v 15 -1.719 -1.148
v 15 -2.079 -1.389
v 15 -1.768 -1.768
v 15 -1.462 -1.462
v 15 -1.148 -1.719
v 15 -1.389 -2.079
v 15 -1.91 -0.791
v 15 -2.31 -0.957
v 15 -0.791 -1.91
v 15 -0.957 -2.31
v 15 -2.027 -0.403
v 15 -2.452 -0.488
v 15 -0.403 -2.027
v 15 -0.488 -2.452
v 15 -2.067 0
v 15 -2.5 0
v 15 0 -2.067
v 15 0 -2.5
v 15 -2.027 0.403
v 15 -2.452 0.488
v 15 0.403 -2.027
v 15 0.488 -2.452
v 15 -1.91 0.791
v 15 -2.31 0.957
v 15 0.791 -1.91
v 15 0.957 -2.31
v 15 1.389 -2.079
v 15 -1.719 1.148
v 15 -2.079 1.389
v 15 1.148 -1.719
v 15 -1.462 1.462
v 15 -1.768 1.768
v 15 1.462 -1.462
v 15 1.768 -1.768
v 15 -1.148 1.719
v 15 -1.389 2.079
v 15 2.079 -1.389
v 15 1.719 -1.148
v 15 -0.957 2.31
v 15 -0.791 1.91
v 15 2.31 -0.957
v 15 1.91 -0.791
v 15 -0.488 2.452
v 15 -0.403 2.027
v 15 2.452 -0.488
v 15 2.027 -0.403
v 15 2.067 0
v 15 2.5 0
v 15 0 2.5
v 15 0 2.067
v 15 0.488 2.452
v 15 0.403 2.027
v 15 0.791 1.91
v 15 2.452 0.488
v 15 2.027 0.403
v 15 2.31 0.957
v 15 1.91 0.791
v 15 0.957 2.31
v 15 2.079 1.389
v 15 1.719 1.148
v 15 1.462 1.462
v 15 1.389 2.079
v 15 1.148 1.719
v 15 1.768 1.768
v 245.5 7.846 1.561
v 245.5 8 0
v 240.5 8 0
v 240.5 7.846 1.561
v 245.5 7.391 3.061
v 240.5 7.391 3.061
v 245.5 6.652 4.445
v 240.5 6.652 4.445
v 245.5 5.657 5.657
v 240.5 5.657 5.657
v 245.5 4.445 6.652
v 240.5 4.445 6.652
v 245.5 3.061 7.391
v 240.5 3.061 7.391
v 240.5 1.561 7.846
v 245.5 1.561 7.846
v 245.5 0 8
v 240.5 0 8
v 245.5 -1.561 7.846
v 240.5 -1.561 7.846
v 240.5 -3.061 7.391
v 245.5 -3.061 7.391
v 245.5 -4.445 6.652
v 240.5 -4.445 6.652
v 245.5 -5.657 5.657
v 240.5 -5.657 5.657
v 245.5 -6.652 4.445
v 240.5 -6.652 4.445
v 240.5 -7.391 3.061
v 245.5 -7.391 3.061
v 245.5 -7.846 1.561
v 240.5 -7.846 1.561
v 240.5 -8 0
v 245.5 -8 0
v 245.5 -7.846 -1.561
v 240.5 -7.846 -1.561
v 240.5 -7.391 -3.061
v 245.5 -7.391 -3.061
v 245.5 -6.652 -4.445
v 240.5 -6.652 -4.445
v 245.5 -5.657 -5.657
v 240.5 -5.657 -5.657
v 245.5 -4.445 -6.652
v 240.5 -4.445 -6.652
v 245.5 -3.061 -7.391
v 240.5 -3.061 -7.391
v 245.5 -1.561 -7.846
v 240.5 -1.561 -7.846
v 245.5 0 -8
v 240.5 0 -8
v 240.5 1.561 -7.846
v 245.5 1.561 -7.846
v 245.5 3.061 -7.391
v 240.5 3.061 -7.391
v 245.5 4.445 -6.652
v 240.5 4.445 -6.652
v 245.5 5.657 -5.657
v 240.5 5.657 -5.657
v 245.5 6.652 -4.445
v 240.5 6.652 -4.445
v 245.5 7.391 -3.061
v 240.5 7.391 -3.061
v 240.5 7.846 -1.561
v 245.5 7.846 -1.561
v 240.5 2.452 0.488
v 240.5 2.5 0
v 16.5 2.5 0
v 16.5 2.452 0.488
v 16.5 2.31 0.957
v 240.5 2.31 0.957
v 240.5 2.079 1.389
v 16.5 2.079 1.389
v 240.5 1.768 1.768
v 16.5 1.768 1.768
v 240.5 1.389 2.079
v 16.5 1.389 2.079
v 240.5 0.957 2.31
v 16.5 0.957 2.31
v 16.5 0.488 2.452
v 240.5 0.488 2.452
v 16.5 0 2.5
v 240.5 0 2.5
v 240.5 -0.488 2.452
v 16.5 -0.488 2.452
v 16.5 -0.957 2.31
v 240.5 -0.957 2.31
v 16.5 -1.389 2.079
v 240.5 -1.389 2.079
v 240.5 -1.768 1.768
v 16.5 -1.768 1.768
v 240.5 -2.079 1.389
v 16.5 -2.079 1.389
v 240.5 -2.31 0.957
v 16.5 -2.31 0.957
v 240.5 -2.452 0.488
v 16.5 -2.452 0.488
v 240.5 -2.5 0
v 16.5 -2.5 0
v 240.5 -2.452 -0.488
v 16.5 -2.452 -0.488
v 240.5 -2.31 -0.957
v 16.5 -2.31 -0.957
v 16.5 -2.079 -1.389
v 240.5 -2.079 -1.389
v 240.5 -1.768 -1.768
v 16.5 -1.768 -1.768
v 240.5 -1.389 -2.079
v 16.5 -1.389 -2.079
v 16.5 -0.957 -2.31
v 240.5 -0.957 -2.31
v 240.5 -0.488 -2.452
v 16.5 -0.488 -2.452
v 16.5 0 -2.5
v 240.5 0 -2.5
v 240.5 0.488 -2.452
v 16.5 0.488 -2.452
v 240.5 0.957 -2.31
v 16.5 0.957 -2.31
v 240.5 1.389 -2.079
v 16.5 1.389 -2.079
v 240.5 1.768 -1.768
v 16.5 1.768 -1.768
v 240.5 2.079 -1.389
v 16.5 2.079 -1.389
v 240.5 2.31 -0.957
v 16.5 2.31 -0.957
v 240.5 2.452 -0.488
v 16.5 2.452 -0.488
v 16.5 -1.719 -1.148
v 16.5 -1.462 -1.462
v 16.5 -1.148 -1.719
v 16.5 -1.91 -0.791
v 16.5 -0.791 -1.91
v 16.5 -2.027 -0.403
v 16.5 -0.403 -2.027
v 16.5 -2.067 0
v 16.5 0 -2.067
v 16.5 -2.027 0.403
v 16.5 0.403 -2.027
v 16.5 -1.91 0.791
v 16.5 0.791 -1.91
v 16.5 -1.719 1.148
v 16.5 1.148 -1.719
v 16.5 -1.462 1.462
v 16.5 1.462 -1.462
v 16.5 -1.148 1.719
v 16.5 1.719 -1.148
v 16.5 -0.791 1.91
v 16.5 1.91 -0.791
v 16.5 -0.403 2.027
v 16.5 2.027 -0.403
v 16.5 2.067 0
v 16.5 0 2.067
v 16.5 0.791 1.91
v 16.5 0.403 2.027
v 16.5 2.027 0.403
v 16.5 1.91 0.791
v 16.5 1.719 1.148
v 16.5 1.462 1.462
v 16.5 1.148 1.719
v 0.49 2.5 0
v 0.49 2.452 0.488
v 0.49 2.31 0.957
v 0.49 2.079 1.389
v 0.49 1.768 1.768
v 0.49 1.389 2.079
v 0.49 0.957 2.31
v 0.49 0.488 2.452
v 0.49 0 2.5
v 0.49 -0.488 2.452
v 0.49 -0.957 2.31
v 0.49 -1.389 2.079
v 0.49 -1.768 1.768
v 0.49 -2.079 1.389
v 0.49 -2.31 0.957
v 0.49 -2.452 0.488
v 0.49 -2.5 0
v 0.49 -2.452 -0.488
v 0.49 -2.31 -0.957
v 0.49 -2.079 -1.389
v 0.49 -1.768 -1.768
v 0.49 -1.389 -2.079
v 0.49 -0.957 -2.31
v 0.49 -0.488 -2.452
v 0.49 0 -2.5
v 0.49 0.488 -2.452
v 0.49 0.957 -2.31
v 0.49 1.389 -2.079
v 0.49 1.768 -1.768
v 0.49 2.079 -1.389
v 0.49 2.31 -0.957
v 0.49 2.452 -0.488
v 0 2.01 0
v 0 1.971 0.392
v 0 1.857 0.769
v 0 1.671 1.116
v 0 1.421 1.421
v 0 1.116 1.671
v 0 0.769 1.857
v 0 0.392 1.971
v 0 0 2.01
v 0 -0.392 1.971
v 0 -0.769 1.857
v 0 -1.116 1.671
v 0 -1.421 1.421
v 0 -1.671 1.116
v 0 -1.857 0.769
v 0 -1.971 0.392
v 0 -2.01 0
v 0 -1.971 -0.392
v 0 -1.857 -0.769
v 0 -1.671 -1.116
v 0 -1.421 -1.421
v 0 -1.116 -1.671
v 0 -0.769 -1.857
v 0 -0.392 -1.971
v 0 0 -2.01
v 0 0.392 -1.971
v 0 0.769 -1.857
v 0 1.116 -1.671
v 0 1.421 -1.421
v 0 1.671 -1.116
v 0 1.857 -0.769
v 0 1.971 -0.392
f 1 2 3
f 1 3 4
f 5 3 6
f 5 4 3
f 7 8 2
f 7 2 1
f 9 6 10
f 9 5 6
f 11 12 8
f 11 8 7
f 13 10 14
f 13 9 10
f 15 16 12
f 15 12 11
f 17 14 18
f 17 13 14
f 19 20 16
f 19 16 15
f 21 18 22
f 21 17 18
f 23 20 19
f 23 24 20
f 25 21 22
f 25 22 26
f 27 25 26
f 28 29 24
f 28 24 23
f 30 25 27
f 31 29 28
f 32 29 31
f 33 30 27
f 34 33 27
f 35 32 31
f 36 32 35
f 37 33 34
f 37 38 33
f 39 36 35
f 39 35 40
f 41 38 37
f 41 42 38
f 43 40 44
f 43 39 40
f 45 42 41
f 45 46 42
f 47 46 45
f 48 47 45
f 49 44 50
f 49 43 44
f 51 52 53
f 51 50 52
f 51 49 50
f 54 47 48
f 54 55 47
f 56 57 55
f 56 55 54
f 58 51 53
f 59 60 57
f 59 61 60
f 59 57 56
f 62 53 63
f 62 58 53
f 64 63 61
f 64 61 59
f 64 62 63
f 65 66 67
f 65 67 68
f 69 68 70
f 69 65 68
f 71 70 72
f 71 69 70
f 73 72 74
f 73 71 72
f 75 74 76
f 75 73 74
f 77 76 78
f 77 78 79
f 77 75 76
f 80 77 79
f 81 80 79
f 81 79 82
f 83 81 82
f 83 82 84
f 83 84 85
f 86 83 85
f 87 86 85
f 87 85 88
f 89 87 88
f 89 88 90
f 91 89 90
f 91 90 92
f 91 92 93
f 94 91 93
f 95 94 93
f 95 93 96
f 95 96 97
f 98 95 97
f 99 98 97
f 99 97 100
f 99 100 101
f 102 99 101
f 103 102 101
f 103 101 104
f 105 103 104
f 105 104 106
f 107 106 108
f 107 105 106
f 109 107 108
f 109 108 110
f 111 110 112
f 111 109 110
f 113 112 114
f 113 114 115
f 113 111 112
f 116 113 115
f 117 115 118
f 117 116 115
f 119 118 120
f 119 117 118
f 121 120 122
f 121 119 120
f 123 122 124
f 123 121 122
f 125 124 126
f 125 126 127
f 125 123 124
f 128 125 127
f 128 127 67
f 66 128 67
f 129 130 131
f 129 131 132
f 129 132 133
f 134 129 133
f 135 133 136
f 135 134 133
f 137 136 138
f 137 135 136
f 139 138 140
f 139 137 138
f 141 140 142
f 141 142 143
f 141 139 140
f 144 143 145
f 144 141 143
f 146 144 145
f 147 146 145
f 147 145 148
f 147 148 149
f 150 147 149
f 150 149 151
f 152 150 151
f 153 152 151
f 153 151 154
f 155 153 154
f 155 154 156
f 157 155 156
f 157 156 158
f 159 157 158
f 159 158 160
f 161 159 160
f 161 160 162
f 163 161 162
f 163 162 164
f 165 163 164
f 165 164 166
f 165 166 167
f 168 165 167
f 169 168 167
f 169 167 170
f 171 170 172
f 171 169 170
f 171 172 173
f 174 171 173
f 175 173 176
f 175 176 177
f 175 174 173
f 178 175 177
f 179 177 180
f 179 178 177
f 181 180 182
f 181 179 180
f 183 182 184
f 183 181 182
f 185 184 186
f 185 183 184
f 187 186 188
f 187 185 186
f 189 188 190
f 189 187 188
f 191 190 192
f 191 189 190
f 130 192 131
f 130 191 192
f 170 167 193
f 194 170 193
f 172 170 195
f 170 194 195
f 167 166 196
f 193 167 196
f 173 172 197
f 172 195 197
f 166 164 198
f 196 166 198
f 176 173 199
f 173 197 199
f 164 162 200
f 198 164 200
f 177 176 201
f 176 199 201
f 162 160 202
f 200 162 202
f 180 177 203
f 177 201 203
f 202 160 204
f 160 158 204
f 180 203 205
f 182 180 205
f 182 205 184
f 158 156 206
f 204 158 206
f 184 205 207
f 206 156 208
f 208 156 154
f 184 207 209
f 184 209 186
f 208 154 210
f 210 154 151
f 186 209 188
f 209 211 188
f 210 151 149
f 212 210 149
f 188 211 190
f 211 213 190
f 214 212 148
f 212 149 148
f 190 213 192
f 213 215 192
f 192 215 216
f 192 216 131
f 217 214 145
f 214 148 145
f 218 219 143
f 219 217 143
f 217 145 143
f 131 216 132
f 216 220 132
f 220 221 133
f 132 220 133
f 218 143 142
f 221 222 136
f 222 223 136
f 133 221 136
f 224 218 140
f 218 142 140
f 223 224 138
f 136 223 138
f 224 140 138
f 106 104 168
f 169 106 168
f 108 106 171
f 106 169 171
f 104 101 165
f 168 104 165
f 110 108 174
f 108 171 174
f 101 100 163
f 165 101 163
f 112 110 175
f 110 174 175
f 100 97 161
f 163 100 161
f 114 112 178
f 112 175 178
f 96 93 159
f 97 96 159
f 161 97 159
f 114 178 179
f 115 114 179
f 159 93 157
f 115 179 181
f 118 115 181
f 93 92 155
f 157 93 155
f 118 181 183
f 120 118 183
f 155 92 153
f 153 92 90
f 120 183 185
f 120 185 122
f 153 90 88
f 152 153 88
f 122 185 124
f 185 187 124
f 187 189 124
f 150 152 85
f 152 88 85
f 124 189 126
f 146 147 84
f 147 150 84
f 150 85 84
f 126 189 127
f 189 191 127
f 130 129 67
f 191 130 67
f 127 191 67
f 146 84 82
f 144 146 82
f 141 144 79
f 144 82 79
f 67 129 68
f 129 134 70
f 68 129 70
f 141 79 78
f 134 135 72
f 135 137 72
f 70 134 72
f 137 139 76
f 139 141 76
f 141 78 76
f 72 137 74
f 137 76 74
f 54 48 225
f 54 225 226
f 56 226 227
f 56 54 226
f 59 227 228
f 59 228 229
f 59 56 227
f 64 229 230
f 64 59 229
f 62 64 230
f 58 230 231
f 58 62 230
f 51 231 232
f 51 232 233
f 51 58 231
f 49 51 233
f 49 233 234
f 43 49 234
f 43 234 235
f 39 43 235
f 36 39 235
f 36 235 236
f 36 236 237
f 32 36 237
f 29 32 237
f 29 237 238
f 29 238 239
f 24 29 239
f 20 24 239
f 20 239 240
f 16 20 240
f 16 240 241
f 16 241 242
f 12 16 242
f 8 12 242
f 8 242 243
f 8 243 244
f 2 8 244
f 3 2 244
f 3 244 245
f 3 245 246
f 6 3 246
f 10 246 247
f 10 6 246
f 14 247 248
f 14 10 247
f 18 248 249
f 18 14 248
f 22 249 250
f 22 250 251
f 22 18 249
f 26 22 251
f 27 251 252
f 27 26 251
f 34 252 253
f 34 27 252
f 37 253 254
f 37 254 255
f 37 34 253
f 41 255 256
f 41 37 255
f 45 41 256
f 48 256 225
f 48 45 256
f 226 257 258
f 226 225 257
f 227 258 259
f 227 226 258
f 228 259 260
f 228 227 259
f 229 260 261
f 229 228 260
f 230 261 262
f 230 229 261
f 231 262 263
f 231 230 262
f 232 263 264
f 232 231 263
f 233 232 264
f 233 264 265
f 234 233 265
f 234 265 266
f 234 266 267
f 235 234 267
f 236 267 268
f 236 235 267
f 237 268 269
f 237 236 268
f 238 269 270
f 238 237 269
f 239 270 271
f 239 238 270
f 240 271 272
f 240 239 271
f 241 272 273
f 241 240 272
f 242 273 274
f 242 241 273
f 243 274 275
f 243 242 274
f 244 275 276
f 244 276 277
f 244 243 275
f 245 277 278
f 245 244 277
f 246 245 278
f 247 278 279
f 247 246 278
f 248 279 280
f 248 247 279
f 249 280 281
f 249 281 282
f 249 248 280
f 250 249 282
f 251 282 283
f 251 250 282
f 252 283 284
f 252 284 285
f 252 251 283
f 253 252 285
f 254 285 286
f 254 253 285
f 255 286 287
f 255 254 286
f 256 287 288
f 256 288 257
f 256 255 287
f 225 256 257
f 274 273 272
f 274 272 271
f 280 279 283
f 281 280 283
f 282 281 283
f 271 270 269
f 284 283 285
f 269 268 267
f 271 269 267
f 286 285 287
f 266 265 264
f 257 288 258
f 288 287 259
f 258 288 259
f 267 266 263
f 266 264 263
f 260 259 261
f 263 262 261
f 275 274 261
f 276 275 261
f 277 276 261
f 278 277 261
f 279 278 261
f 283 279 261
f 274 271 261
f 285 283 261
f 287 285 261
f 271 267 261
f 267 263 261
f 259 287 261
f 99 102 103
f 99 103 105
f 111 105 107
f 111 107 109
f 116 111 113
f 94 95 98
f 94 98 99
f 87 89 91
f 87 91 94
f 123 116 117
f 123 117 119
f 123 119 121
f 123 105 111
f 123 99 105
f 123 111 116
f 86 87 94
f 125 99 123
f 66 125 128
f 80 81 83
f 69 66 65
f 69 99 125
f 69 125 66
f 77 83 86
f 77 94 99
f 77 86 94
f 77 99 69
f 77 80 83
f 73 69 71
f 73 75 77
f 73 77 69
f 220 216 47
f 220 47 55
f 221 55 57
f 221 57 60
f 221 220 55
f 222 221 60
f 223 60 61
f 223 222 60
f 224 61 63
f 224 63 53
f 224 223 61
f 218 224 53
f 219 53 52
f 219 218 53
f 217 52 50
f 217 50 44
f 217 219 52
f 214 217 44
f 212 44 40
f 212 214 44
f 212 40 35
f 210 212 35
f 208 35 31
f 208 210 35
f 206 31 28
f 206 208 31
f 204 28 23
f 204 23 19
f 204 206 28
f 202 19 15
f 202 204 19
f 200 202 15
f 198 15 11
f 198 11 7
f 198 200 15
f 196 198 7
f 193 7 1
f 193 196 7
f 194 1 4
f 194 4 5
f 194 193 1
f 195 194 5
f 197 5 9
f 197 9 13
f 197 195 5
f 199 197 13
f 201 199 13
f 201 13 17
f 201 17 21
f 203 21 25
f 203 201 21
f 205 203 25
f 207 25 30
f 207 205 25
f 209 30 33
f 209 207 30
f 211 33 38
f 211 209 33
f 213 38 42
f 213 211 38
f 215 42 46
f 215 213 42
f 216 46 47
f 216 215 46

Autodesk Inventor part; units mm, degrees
sketch "Sketch_5" plane through (0, 0, 0) normal (0, 0, 1) x (1, 0, 0)
  line L0 (245.5, 0) -> (0, 0)
  line L1 (0, 0) -> (0, 2.0095)
  line L2 (0, 2.0095) -> (0.4905, 2.5)
  line L3 (0.4905, 2.5) -> (15, 2.5)
  line L4 (15, 2.5) -> (15, 2.067)
  line L5 (15, 2.067) -> (16.5, 2.067)
  line L6 (16.5, 2.067) -> (16.5, 2.5)
  line L7 (16.5, 2.5) -> (240.5, 2.5)
  line L8 (240.5, 2.5) -> (240.5, 8)
  line L9 (240.5, 8) -> (245.5, 8)
  line L10 (245.5, 8) -> (245.5, 0)
  line L11 (245.5, 0) -> (0, 0)
revolve "Revolution1" add sketch "Sketch_5" angle 360 about axis through (245.5, 0, 0) along (1, 0, 0)
thread "Thread1" size "M5x0.8" class "6g" standard "ISO Metric profile" full length
ref_plane "ROD_BA_XY" through (10, 0, 0) normal (-1, 0, 0) x (0, 0, -1)
ref_plane "ROD_BA_YZ" through (10, 0, 0) normal (0, 0, -1) x (0, -1, 0)
ref_plane "ROD_BA_ZX" through (10, 0, 0) normal (0, -1, 0) x (-1, 0, 0)
ref_plane "ROD_BODY_XY" through (28, 0, 0) normal (-1, 0, 0) x (0, 0, -1)
ref_plane "ROD_BODY_YZ" through (28, 0, 0) normal (0, 0, -1) x (0, -1, 0)
ref_plane "ROD_BODY_ZX" through (28, 0, 0) normal (0, -1, 0) x (-1, 0, 0)
ref_plane "rodnt1_XY" through (7.5, 0, 0) normal (1, 0, 0) x (0, 0, -1)
ref_plane "rodnt1_YZ" through (7.5, 0, 0) normal (0, 0, -1) x (0, 1, 0)
ref_plane "rodnt1_ZX" through (7.5, 0, 0) normal (0, 1, 0) x (1, 0, 0)
properties part number "CJ2B16-200Z_ROD" material "鉄、鋳鉄"
